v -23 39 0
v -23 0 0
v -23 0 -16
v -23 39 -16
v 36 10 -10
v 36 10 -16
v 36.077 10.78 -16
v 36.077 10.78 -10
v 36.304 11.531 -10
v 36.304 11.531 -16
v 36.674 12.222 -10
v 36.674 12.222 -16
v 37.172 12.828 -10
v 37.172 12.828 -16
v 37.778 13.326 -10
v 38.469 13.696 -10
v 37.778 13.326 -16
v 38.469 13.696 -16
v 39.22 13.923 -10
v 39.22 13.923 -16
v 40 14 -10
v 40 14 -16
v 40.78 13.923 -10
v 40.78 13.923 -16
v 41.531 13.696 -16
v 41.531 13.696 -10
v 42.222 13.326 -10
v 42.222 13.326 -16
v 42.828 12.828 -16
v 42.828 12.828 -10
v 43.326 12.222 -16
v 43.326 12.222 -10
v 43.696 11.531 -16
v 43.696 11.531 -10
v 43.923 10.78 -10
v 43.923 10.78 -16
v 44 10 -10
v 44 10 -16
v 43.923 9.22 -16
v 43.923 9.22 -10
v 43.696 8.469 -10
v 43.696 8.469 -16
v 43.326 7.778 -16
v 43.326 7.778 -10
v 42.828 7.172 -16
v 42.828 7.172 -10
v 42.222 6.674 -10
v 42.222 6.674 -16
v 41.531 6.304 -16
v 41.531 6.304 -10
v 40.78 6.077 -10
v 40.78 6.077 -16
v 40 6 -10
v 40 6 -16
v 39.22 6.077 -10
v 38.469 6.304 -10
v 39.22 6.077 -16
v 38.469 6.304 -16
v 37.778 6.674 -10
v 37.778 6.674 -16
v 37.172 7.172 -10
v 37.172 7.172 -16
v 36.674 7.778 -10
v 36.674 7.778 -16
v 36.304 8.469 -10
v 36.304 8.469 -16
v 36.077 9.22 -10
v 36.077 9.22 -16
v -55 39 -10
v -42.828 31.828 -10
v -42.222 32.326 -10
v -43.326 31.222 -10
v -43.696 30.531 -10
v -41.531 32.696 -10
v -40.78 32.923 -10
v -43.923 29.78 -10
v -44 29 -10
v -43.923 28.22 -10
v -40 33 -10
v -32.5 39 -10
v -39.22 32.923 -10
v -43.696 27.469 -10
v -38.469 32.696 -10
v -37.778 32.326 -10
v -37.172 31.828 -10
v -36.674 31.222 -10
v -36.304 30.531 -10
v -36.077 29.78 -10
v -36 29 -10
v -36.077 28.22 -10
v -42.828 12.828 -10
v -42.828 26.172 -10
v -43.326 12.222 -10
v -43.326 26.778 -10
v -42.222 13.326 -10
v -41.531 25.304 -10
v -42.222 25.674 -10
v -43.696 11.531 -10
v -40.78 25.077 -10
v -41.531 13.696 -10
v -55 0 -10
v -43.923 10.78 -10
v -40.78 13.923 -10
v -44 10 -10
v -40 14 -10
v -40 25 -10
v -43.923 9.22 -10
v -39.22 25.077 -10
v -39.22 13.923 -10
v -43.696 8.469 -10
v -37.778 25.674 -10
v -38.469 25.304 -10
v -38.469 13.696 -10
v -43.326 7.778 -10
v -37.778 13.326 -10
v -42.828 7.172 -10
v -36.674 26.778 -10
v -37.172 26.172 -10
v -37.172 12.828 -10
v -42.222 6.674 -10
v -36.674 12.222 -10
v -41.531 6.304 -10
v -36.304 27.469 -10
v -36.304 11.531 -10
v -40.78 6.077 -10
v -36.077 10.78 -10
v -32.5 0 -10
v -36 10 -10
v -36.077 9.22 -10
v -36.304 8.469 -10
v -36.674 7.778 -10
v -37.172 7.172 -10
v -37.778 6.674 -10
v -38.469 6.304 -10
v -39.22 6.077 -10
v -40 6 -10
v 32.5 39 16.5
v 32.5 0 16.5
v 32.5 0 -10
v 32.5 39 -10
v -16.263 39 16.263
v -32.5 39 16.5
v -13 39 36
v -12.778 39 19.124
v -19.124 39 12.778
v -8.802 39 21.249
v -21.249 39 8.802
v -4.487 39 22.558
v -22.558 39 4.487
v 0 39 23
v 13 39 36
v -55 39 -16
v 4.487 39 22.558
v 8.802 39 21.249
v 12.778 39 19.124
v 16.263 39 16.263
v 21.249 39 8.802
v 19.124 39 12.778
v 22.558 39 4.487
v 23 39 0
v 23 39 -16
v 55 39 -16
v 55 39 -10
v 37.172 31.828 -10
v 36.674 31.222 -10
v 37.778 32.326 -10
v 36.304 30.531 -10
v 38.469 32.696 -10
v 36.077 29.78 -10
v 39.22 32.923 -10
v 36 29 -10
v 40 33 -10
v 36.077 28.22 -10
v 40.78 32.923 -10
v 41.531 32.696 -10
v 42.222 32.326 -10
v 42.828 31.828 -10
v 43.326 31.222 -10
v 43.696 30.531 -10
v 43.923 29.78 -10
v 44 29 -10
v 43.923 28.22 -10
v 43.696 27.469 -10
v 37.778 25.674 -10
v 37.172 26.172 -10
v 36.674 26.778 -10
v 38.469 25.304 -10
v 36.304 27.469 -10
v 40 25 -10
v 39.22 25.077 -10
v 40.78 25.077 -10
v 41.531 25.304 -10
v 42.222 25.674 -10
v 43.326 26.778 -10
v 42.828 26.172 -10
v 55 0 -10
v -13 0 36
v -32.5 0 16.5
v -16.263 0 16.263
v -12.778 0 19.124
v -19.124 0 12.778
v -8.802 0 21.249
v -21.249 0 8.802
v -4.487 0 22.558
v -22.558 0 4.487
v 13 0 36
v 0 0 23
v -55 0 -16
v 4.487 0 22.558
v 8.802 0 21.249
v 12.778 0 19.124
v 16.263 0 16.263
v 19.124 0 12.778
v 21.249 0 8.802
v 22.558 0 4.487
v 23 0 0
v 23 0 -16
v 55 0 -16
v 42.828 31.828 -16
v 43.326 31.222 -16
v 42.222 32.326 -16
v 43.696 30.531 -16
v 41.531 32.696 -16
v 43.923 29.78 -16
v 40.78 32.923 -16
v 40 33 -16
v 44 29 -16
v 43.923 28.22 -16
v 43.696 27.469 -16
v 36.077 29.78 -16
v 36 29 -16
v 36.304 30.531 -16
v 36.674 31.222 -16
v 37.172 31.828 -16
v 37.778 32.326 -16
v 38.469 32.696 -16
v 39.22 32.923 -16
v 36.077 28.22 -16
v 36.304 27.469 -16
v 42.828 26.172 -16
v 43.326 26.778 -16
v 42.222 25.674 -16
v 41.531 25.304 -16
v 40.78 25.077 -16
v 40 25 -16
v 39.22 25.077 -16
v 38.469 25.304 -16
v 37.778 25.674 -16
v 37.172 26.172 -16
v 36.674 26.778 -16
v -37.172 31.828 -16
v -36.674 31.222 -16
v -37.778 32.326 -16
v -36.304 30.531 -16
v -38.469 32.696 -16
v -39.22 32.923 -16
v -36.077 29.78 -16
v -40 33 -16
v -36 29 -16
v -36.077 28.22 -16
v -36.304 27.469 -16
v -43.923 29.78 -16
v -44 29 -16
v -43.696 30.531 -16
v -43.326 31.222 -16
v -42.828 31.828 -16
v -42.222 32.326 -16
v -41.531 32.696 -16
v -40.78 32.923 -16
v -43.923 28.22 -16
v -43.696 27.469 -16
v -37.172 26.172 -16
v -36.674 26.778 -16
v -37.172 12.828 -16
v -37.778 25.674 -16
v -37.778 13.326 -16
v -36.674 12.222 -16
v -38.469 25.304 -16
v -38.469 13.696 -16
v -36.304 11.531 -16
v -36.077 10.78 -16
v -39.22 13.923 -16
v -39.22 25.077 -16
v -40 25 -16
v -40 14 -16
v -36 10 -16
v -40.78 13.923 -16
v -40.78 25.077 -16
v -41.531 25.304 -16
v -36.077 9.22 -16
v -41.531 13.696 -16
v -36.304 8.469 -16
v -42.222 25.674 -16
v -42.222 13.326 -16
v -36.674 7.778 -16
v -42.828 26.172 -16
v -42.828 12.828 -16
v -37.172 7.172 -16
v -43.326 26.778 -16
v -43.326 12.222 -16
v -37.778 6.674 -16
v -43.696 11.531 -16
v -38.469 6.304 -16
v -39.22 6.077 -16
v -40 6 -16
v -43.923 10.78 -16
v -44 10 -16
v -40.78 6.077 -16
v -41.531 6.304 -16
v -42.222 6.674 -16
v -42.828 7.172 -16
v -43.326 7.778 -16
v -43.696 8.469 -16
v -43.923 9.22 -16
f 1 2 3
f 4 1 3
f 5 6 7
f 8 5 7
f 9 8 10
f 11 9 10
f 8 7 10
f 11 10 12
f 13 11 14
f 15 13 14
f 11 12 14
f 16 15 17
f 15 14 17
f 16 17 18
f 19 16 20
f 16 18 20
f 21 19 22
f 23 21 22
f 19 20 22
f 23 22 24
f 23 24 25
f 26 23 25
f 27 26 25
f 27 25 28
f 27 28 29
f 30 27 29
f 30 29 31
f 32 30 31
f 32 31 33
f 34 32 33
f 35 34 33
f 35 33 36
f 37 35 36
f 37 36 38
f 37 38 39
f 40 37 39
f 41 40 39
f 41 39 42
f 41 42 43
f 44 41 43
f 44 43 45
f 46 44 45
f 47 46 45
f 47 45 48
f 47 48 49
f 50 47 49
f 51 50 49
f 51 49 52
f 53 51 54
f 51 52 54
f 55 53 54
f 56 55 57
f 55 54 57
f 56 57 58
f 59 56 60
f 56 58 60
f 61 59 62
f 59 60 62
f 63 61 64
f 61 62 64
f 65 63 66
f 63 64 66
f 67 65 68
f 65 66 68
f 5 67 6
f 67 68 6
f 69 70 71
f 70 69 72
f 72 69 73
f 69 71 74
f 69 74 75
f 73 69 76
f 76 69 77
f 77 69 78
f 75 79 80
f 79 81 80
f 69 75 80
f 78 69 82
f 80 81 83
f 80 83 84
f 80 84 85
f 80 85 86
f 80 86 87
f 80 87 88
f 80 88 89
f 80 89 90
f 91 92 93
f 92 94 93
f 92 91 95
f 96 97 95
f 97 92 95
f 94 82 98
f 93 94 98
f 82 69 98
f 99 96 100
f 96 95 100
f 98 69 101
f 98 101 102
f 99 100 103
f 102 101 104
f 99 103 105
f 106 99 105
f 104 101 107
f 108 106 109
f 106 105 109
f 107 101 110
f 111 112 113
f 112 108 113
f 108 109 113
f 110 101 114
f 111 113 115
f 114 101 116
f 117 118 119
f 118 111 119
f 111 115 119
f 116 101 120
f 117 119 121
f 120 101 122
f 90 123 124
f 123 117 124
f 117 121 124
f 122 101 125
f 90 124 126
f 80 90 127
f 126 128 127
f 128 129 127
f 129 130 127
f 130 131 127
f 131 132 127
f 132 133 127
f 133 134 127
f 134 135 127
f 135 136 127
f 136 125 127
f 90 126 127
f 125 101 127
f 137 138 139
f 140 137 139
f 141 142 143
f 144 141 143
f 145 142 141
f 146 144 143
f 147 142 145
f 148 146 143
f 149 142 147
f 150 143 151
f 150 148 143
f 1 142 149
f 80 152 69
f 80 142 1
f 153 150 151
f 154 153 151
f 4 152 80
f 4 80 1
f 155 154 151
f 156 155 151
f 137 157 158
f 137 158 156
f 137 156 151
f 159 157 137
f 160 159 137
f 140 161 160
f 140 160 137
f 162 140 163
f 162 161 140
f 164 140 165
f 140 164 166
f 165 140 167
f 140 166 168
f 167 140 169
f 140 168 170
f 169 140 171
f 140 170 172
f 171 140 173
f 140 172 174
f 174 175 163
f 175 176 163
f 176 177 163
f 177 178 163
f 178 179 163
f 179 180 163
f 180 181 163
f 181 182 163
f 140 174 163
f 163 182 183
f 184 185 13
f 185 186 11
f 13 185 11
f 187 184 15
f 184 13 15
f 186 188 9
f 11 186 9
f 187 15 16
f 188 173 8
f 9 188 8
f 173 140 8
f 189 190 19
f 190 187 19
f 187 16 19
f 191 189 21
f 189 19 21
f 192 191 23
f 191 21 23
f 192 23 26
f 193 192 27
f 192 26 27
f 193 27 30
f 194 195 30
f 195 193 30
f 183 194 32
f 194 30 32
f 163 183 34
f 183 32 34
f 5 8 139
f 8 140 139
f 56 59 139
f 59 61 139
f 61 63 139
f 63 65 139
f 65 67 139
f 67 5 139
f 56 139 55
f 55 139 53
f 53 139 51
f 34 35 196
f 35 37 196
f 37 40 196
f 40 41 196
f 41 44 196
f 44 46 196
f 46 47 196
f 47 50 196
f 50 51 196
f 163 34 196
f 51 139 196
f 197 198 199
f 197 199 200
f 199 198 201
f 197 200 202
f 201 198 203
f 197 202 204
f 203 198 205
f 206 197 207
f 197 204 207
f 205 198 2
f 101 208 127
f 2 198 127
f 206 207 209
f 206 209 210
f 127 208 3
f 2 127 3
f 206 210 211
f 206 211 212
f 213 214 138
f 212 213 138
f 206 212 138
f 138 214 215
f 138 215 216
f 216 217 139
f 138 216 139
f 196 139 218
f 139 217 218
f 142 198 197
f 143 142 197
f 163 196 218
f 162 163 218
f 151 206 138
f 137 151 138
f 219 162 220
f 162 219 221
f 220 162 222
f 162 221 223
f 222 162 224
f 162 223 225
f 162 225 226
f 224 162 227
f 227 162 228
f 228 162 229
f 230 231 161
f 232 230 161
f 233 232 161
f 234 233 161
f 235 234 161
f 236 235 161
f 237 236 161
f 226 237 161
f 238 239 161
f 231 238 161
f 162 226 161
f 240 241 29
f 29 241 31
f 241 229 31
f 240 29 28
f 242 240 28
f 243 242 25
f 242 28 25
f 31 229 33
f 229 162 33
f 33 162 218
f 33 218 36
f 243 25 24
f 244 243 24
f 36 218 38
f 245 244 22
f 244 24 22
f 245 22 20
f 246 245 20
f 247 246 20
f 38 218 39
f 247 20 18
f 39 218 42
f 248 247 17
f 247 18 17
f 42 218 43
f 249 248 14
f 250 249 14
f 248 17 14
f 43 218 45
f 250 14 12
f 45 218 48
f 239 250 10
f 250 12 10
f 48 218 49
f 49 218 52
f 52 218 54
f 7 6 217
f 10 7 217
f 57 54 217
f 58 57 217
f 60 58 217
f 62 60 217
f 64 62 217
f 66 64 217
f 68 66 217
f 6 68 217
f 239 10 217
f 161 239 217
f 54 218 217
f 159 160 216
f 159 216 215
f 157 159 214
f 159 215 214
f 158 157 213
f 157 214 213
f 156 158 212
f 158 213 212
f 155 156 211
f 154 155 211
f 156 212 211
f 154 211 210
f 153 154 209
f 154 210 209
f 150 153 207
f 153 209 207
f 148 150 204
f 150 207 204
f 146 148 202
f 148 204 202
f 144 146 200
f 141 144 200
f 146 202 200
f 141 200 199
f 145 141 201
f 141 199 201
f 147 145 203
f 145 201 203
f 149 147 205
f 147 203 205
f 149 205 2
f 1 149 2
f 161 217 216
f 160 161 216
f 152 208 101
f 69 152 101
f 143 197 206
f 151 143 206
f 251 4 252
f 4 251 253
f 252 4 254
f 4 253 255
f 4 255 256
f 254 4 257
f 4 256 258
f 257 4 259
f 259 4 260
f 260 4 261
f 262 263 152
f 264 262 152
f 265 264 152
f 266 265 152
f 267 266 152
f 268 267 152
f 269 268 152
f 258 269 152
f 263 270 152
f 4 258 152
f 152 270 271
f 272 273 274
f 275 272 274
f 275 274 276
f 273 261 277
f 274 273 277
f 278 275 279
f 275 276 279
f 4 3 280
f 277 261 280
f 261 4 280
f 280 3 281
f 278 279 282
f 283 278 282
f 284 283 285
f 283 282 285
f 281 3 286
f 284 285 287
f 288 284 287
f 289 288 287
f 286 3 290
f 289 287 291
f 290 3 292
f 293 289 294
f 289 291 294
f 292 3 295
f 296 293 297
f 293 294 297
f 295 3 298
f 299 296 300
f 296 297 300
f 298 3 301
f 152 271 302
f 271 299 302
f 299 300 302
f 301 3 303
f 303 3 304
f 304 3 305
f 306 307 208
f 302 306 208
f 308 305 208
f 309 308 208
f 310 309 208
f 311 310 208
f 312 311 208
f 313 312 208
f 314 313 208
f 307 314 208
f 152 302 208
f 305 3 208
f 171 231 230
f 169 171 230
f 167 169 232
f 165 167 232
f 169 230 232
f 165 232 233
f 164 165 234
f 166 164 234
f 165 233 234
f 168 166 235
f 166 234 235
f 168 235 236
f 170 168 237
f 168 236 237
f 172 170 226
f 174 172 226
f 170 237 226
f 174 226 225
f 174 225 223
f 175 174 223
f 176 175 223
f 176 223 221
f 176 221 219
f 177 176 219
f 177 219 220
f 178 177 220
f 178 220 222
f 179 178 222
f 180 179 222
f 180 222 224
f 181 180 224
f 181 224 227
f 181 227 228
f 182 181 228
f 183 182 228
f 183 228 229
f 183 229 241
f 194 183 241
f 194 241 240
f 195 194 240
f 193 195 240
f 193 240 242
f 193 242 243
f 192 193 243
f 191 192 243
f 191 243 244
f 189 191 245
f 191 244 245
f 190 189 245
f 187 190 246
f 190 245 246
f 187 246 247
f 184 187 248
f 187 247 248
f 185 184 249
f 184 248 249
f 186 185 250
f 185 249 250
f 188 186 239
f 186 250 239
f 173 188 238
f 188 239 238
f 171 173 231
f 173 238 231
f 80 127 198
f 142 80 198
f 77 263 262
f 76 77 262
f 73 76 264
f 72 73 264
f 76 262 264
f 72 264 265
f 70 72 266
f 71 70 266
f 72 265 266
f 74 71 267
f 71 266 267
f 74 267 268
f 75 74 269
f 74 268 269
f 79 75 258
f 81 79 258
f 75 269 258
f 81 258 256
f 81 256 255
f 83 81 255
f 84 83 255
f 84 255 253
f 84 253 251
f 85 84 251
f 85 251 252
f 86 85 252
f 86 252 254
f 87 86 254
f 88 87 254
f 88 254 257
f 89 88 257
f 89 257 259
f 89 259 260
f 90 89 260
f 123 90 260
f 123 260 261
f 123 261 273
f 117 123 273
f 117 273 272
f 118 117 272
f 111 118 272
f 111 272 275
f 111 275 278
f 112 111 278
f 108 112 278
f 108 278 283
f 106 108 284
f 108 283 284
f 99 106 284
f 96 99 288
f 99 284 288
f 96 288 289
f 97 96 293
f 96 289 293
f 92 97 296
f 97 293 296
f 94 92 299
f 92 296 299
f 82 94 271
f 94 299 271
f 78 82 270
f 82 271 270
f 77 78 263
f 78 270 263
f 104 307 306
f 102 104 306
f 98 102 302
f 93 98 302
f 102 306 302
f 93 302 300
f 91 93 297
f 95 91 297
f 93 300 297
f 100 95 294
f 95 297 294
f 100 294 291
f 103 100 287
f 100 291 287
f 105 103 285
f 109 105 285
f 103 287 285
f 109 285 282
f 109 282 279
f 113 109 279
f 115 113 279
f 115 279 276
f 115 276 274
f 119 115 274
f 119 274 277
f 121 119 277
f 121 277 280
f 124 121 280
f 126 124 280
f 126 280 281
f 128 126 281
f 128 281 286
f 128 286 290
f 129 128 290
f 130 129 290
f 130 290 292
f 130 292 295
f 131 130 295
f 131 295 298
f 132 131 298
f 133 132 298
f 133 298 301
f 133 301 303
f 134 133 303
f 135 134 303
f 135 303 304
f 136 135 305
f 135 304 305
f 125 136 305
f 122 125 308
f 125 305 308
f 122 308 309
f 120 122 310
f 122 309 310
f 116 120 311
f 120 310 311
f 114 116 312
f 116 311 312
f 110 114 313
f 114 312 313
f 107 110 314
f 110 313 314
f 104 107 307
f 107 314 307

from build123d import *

# Parameters (mm, degrees)
BOSS_EXTRUDE1_DEPTH = 39
SKETCH2_R           = 4
CUT_EXTRUDE1_DEPTH  = 53


with BuildPart() as part:
    # Sketch1 → Boss-Extrude1 (new body)
    with BuildSketch(Plane(origin=(0, 0, 0), x_dir=(1, 0, 0), z_dir=(0, 1, 0))):
        with BuildLine():
            Line((-23, 0), (-23, 10))
            Line((-23, 10), (-23, 16))
            Line((-23, 16), (-55, 16))
            Line((-55, 16), (-55, 10))
            Line((-55, 10), (-32.5, 10))
            Line((-32.5, 10), (-32.5, -16.5))
            Line((-32.5, -16.5), (-13, -36))
            Line((-13, -36), (13, -36))
            Line((13, -36), (32.5, -16.5))
            Line((32.5, -16.5), (32.5, 10))
            Line((32.5, 10), (55, 10))
            Line((55, 10), (55, 16))
            Line((55, 16), (23, 16))
            Line((23, 16), (23, 10))
            Line((23, 10), (23, 0))
            ThreePointArc((23, 0), (0, -23), (-23, 0))
        make_face()
    extrude(amount=BOSS_EXTRUDE1_DEPTH)

    # Sketch2 → Cut-Extrude1 (cut, through all)
    with BuildSketch(Plane(origin=(0, 0, -16), x_dir=(-1, 0, 0), z_dir=(0, 0, -1))):
        with Locations((-40, 29)):
            Circle(SKETCH2_R)
        with Locations((-40, 10)):
            Circle(SKETCH2_R)
        with Locations((40, 29)):
            Circle(SKETCH2_R)
        with Locations((40, 10)):
            Circle(SKETCH2_R)
    extrude(amount=-CUT_EXTRUDE1_DEPTH, mode=Mode.SUBTRACT)


solid = part.part
